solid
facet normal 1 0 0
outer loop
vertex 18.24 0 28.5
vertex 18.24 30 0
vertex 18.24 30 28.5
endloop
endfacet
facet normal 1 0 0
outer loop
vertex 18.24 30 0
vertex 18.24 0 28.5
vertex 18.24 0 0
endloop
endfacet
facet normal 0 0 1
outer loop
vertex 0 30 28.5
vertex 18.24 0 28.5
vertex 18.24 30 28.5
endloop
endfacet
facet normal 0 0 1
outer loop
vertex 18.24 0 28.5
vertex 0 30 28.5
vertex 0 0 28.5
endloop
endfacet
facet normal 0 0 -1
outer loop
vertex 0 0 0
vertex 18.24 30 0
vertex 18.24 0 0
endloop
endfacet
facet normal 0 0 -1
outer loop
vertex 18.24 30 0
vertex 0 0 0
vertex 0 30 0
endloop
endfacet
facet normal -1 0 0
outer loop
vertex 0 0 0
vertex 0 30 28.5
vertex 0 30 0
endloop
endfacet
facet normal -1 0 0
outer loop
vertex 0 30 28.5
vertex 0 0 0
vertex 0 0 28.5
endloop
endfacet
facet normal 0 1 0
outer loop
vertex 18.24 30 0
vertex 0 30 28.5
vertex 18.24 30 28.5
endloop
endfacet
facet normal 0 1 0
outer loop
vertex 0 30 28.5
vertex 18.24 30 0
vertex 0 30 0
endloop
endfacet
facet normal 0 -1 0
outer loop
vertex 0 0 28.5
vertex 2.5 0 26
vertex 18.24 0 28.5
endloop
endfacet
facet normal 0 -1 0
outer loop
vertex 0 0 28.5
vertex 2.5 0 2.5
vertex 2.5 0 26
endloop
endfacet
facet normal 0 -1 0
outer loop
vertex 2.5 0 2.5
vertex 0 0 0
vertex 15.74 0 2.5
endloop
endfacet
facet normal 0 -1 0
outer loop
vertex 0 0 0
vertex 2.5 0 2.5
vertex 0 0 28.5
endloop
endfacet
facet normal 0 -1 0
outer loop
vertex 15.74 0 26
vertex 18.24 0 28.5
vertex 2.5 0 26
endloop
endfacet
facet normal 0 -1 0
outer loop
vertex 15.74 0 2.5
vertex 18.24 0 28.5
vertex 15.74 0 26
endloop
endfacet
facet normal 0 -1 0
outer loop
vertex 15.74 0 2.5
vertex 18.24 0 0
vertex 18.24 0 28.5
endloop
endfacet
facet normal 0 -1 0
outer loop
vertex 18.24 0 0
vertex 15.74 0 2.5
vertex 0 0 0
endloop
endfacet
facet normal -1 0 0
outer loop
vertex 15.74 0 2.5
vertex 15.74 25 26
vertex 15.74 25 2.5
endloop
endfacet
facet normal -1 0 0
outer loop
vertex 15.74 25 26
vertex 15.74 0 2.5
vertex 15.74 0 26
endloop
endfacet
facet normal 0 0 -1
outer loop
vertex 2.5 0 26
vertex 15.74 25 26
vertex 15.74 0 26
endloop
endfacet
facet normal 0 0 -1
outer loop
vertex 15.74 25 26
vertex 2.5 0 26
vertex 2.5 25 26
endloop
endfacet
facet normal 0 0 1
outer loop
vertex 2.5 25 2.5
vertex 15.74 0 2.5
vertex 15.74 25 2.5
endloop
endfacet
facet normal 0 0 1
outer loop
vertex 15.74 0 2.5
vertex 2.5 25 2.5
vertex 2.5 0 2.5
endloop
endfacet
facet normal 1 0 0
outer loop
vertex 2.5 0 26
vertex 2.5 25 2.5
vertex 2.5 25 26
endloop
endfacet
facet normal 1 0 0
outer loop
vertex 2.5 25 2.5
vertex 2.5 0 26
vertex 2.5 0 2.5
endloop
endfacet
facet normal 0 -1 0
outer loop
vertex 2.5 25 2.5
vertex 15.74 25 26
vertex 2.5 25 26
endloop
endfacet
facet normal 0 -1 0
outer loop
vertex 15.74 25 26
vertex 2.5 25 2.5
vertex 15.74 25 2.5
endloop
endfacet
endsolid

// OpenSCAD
clearance = .8;
servoWidth = 12.44 + clearance;
servoHeight = 22.7 + clearance;
servoDepth = 25;
padding = 5;
boxWidth = servoWidth + padding;
boxHeight = servoHeight + padding;
boxDepth = servoDepth + padding;




difference() {
    cube([boxWidth, boxDepth, boxHeight]);
    translate(v = [(boxWidth-servoWidth)/2, 0, (boxHeight-servoHeight)/2]){
    cube([servoWidth, servoDepth , servoHeight]);
    }
    
}
